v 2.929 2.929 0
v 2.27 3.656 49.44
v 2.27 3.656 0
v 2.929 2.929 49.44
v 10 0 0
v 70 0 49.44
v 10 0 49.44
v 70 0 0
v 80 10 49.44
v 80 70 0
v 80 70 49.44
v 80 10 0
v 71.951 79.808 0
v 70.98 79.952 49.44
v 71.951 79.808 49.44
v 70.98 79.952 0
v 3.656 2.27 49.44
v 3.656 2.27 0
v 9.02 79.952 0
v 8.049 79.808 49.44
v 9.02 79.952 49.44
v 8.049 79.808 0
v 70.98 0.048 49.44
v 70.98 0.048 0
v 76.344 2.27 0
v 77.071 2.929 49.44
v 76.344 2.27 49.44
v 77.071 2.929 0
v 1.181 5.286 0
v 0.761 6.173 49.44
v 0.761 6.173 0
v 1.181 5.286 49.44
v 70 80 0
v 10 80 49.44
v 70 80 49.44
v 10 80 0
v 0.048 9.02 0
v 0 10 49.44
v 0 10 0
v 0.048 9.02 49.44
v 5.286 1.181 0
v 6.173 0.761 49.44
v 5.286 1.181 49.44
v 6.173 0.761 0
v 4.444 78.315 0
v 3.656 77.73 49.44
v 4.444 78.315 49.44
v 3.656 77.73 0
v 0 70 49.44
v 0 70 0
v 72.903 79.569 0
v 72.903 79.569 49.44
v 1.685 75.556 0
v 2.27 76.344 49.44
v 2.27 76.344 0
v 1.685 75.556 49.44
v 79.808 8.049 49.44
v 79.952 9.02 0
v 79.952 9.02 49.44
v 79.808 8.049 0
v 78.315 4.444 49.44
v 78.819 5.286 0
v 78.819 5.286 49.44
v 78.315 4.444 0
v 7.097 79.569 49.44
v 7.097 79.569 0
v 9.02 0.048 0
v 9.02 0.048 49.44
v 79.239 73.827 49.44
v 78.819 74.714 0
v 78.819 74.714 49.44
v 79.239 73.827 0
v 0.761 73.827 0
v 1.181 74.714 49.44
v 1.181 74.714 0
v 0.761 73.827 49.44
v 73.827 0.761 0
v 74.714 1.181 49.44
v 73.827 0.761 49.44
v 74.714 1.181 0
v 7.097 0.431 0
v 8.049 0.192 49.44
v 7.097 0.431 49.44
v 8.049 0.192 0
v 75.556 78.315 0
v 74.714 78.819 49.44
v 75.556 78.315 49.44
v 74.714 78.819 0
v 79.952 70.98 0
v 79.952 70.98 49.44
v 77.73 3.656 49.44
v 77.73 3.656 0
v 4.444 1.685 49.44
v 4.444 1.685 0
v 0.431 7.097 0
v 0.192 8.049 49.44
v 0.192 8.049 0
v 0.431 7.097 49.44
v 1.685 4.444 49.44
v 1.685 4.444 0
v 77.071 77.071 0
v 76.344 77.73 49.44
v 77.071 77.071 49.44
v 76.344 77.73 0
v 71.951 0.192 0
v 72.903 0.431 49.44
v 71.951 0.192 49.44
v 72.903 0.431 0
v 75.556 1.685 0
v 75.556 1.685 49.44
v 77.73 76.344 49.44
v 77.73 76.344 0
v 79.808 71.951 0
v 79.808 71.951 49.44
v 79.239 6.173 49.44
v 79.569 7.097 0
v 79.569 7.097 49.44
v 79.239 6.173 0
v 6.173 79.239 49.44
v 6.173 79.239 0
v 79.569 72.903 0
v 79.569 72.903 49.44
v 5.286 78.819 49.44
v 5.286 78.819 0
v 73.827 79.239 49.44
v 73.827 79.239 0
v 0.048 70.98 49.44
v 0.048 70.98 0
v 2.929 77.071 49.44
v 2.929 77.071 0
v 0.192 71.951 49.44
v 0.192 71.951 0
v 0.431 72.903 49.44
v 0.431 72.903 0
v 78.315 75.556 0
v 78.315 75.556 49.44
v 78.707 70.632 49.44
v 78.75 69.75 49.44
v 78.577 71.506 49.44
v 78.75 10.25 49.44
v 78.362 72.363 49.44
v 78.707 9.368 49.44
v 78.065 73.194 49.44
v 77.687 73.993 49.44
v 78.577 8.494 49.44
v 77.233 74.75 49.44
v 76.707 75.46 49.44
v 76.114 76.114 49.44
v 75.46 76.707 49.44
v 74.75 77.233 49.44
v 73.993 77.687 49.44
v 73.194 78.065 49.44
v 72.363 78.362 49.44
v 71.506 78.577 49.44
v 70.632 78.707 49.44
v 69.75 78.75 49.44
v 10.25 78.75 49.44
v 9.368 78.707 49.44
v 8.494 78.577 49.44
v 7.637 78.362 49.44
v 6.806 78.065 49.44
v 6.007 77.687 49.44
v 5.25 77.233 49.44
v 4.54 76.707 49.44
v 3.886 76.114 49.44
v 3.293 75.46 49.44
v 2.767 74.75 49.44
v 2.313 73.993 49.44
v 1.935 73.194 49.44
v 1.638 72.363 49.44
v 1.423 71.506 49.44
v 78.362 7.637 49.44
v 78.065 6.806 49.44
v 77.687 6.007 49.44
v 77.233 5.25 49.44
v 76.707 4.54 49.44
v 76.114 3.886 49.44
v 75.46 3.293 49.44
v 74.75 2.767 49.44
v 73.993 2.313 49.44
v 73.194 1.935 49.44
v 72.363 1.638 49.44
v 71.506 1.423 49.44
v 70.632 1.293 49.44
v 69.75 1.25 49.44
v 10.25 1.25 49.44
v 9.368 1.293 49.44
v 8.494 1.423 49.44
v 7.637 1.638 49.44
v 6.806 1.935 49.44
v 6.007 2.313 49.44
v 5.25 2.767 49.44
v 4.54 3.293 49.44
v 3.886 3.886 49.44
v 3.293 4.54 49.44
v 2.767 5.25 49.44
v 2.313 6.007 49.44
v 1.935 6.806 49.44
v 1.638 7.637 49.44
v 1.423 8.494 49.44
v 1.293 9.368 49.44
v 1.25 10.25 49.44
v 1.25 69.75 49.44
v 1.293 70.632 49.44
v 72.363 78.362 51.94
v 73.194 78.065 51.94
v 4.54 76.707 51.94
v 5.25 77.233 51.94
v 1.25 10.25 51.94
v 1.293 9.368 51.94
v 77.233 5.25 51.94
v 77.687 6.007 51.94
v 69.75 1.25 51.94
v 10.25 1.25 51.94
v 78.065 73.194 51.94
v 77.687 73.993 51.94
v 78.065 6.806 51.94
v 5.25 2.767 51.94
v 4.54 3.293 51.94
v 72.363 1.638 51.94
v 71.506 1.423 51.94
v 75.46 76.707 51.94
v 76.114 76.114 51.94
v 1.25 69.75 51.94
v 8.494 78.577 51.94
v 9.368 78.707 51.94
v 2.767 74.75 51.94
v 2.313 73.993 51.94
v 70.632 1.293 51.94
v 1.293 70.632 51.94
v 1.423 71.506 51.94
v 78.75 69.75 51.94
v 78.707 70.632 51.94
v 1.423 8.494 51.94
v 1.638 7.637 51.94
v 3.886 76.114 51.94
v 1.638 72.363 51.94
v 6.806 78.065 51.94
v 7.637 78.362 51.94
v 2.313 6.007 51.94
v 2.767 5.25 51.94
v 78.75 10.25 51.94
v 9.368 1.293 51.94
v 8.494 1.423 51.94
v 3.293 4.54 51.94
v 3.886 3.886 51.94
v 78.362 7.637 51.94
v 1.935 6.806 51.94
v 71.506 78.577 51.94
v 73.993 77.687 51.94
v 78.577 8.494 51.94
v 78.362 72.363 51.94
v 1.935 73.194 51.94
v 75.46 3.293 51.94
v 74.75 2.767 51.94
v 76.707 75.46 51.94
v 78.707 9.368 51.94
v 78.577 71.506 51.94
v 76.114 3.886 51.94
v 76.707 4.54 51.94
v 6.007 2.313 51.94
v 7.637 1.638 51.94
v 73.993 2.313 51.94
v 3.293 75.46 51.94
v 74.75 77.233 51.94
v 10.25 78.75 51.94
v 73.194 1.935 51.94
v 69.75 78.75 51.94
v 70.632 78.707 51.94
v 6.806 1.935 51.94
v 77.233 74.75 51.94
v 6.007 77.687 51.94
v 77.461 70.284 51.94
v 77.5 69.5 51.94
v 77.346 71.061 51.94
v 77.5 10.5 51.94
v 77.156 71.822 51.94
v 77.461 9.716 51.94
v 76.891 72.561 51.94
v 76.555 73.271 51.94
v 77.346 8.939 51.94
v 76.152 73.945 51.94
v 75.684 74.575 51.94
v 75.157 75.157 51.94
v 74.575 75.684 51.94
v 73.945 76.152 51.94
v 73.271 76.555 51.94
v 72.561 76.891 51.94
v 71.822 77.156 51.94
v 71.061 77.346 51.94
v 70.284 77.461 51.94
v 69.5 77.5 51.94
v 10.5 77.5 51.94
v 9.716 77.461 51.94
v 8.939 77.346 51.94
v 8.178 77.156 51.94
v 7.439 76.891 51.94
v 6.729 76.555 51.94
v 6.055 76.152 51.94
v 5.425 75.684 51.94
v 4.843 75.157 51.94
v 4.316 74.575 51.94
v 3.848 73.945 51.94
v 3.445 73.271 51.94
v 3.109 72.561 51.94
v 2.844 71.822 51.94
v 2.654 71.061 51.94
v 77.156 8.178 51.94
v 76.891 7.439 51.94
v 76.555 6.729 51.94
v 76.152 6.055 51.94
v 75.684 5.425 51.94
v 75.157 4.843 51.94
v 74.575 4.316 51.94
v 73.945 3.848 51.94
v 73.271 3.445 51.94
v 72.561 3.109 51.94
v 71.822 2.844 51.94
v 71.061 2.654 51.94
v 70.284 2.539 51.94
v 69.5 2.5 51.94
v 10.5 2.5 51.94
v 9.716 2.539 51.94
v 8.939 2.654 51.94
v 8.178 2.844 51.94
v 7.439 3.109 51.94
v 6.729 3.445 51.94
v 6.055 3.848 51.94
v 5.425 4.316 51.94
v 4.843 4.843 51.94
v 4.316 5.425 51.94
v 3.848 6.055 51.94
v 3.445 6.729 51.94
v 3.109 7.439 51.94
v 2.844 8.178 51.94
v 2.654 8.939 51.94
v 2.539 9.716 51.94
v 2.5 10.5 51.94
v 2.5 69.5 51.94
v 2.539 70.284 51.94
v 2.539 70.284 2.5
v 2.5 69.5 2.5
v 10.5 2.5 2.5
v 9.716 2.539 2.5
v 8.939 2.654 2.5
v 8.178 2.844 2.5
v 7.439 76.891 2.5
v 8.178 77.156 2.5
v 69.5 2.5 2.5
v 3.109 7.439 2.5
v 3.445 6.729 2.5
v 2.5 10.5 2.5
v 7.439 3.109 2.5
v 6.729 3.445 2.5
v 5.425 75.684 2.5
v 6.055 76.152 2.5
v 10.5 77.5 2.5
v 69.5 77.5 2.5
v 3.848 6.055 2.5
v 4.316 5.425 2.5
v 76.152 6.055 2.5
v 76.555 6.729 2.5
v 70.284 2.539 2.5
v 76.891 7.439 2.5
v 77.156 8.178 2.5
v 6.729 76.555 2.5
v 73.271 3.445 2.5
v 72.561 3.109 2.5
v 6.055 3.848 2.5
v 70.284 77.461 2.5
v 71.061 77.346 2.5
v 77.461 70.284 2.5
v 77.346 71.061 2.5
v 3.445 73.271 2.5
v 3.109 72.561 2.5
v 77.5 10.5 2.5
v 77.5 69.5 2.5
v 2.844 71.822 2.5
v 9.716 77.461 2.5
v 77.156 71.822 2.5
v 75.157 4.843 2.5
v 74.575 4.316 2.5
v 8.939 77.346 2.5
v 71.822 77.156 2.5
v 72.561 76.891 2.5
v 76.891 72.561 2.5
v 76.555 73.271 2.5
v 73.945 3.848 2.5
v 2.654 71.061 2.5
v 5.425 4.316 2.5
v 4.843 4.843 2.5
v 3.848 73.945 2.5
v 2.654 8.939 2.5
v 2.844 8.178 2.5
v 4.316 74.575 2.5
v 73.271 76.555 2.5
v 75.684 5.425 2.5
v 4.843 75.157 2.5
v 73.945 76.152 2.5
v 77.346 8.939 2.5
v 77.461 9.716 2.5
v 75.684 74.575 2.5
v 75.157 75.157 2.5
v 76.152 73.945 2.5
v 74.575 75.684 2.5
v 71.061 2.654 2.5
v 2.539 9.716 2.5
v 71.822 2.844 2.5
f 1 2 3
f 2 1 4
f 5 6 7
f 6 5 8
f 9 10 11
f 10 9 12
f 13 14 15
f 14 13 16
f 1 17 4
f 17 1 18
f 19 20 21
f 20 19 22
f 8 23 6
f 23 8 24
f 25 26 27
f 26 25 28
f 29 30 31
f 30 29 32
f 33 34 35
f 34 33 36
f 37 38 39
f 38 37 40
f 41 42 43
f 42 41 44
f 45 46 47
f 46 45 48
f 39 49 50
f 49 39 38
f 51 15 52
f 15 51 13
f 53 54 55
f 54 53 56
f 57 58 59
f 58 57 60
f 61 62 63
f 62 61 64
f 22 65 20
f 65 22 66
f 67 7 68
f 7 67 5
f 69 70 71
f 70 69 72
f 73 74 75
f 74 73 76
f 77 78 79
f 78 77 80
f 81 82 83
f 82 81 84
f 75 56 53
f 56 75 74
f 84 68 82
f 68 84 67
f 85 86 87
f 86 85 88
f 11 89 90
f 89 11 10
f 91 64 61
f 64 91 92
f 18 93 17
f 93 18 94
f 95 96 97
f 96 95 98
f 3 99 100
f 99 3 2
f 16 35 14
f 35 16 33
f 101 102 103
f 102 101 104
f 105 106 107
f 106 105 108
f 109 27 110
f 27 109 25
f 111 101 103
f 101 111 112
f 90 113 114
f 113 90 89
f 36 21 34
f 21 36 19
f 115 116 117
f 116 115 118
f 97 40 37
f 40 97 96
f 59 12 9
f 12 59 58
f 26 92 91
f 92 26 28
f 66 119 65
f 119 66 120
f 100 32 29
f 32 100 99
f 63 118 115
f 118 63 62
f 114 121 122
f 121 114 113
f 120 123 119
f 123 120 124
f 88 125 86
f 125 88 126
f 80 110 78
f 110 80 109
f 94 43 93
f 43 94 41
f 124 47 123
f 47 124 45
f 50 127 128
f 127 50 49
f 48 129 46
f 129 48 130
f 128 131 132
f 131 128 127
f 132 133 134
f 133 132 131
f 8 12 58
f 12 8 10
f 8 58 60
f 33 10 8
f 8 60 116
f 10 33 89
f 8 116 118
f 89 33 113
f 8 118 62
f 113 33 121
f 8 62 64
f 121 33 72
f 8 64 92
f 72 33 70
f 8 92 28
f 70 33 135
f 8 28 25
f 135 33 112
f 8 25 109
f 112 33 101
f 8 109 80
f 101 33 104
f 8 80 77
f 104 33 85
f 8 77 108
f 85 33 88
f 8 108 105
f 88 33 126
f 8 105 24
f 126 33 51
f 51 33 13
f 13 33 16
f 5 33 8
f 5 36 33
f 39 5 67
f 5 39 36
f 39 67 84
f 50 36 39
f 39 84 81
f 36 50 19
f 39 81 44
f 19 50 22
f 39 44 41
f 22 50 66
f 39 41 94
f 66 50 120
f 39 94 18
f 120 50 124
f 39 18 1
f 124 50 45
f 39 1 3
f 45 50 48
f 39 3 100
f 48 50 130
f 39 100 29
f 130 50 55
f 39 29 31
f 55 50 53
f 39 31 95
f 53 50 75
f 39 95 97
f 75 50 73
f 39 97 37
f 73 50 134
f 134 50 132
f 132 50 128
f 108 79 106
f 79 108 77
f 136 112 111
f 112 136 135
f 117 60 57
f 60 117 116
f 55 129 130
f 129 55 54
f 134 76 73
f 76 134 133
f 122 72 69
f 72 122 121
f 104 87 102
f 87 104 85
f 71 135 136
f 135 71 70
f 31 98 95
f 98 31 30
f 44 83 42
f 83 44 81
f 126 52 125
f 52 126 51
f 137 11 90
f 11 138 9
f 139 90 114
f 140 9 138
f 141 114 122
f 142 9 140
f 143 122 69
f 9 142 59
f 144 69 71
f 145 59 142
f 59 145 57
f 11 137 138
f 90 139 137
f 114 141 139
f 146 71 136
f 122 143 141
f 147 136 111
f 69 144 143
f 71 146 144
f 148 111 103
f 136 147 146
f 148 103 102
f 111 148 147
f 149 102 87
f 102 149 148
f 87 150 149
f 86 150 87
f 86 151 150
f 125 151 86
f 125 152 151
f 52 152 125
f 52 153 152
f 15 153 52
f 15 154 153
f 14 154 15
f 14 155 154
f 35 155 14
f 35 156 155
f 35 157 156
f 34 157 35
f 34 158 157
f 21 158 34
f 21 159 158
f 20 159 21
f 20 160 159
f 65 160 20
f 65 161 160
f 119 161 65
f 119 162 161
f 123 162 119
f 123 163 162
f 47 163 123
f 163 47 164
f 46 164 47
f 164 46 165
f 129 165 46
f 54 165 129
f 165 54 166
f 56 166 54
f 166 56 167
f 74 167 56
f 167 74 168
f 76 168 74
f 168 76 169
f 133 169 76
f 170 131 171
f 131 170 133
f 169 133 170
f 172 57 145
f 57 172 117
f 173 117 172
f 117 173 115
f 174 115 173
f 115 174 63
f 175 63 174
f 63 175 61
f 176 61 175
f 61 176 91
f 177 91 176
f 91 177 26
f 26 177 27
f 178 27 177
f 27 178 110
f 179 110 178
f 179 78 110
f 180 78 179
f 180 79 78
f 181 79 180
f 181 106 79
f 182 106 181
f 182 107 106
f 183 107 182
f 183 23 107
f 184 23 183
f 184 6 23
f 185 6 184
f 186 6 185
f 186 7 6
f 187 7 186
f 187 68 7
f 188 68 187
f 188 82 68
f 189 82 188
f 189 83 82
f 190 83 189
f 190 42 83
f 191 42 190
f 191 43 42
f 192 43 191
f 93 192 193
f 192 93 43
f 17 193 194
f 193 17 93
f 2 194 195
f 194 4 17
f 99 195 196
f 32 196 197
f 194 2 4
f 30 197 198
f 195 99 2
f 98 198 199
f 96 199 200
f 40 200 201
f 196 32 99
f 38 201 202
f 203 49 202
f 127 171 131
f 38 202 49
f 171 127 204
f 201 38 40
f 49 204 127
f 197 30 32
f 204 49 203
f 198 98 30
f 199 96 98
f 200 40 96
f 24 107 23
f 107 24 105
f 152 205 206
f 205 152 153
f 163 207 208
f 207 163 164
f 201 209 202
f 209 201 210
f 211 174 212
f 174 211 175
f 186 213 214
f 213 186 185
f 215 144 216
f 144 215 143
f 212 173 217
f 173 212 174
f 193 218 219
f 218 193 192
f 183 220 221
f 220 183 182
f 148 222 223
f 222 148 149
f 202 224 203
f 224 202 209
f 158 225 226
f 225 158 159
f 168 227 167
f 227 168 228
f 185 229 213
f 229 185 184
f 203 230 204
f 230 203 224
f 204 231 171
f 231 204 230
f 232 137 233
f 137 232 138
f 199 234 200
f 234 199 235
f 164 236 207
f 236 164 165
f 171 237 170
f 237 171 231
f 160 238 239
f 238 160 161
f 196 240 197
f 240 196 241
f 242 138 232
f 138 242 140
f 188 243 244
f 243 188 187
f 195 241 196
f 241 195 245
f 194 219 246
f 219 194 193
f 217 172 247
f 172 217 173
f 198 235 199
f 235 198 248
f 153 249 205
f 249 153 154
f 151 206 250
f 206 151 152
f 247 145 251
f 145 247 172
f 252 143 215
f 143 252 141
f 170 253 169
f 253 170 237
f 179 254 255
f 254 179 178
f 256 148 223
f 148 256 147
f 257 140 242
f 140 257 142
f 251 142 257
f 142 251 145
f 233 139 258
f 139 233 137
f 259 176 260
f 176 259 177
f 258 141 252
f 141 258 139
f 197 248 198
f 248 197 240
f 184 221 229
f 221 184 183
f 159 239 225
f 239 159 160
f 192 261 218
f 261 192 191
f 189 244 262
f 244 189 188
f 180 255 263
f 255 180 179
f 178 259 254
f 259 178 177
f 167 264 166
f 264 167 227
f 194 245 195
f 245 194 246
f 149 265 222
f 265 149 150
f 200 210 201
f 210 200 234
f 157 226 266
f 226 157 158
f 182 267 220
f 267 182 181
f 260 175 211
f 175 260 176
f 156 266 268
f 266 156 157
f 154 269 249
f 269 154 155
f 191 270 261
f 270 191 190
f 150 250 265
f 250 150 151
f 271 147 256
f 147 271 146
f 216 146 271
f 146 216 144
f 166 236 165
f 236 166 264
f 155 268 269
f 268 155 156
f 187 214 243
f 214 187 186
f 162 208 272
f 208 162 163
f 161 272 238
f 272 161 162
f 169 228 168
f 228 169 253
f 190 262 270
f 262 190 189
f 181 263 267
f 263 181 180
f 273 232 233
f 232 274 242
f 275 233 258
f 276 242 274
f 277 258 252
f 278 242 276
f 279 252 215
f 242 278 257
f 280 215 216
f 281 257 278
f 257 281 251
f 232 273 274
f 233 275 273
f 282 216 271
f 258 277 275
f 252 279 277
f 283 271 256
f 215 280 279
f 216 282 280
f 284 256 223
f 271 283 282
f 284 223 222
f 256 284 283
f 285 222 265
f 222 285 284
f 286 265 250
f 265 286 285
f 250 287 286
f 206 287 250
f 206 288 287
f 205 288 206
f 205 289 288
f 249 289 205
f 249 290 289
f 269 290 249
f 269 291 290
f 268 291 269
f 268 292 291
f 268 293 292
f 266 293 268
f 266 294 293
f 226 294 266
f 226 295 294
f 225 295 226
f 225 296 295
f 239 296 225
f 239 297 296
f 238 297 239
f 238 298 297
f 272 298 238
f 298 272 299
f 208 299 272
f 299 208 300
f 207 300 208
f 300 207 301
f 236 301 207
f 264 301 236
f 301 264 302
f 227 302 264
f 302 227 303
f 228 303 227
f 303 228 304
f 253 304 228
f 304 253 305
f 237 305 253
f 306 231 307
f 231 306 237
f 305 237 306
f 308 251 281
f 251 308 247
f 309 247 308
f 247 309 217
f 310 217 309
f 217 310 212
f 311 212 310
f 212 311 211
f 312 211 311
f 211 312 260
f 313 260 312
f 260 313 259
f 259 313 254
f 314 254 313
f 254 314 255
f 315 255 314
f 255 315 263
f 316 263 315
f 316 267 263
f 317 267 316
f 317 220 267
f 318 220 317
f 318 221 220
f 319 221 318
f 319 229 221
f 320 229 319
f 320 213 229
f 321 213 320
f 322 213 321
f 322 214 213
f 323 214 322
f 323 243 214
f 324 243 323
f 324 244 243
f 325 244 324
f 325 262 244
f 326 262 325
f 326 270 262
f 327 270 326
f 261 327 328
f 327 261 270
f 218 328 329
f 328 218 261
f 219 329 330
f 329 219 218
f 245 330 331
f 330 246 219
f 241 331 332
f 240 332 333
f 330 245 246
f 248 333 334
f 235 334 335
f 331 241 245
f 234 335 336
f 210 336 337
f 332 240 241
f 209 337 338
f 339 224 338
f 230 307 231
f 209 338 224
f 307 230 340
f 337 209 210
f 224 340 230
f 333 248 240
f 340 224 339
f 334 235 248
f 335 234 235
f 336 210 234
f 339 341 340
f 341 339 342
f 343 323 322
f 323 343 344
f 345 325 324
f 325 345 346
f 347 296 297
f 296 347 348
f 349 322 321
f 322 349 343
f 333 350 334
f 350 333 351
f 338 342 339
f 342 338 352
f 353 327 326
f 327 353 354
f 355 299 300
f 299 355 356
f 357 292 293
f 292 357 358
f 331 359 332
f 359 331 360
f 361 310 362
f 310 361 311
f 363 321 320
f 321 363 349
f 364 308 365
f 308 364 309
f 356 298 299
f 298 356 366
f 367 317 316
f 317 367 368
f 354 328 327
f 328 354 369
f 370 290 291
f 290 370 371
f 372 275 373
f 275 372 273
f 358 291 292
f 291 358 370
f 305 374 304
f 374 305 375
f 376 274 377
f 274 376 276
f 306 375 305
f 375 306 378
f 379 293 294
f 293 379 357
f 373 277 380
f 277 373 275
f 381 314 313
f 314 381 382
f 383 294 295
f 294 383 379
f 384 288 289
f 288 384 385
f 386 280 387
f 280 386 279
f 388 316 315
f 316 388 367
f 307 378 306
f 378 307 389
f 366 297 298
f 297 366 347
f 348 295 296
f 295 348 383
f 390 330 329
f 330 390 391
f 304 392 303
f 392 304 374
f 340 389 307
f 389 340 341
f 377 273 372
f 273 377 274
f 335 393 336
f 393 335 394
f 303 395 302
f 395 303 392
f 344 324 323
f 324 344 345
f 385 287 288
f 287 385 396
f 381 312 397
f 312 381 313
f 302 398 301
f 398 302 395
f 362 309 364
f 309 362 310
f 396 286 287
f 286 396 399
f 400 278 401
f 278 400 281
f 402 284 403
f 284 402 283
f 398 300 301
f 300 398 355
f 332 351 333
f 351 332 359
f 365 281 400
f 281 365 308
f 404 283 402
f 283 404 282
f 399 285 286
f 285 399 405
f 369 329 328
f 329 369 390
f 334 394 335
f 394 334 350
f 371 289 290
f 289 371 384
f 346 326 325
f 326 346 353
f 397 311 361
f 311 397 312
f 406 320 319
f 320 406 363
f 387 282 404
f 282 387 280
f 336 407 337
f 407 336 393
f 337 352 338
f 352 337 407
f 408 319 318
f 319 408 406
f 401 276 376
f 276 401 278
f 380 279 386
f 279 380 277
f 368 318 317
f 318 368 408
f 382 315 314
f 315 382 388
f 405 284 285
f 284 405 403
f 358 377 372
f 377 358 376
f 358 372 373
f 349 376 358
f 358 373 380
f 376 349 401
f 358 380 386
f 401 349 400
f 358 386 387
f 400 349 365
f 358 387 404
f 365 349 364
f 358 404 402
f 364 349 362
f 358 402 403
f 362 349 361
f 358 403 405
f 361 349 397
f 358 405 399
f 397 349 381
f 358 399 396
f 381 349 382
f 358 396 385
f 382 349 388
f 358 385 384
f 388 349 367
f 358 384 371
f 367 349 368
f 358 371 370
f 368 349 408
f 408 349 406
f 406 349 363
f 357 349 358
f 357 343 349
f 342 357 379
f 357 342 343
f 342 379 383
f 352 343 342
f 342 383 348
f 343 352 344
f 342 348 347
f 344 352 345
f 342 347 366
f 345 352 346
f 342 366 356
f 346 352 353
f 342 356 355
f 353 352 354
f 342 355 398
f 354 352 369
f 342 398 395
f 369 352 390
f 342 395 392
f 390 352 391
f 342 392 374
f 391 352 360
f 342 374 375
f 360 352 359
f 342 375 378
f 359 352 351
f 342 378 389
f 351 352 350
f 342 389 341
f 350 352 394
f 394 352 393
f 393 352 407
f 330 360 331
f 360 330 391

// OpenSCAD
// file: dimensions.scad
wall_thickness = 2.5;

case_width = 80;
case_length = 80;
case_height = 80*1.618-80;
// file: rounded_cube.scad
module rounded_cube(a,b,c,r){
    hull(){
        translate([r,r,0]) cylinder(r=r, h=c, $fn=64);
        translate([a-r,r,0]) cylinder(r=r, h=c, $fn=64);
        translate([a-r,b-r,0]) cylinder(r=r, h=c, $fn=64);
        translate([r,b-r,0]) cylinder(r=r, h=c, $fn=64);
    }
}
// main file
include <rounded_cube.scad>
include <dimensions.scad>

module top_cover_base(){
    rounded_cube(case_width,case_length,case_height,10);
    translate([wall_thickness/2, wall_thickness/2,case_height]) rounded_cube(case_width-wall_thickness,case_length-wall_thickness,wall_thickness,9);
};

module top_cover_cuts(){
    translate([wall_thickness,wall_thickness,wall_thickness]) rounded_cube(case_width-2*wall_thickness,case_length-2*wall_thickness,case_height,8);
};

module top_cover(){
    difference() {
        top_cover_base();
        top_cover_cuts();
    }
};

top_cover();
